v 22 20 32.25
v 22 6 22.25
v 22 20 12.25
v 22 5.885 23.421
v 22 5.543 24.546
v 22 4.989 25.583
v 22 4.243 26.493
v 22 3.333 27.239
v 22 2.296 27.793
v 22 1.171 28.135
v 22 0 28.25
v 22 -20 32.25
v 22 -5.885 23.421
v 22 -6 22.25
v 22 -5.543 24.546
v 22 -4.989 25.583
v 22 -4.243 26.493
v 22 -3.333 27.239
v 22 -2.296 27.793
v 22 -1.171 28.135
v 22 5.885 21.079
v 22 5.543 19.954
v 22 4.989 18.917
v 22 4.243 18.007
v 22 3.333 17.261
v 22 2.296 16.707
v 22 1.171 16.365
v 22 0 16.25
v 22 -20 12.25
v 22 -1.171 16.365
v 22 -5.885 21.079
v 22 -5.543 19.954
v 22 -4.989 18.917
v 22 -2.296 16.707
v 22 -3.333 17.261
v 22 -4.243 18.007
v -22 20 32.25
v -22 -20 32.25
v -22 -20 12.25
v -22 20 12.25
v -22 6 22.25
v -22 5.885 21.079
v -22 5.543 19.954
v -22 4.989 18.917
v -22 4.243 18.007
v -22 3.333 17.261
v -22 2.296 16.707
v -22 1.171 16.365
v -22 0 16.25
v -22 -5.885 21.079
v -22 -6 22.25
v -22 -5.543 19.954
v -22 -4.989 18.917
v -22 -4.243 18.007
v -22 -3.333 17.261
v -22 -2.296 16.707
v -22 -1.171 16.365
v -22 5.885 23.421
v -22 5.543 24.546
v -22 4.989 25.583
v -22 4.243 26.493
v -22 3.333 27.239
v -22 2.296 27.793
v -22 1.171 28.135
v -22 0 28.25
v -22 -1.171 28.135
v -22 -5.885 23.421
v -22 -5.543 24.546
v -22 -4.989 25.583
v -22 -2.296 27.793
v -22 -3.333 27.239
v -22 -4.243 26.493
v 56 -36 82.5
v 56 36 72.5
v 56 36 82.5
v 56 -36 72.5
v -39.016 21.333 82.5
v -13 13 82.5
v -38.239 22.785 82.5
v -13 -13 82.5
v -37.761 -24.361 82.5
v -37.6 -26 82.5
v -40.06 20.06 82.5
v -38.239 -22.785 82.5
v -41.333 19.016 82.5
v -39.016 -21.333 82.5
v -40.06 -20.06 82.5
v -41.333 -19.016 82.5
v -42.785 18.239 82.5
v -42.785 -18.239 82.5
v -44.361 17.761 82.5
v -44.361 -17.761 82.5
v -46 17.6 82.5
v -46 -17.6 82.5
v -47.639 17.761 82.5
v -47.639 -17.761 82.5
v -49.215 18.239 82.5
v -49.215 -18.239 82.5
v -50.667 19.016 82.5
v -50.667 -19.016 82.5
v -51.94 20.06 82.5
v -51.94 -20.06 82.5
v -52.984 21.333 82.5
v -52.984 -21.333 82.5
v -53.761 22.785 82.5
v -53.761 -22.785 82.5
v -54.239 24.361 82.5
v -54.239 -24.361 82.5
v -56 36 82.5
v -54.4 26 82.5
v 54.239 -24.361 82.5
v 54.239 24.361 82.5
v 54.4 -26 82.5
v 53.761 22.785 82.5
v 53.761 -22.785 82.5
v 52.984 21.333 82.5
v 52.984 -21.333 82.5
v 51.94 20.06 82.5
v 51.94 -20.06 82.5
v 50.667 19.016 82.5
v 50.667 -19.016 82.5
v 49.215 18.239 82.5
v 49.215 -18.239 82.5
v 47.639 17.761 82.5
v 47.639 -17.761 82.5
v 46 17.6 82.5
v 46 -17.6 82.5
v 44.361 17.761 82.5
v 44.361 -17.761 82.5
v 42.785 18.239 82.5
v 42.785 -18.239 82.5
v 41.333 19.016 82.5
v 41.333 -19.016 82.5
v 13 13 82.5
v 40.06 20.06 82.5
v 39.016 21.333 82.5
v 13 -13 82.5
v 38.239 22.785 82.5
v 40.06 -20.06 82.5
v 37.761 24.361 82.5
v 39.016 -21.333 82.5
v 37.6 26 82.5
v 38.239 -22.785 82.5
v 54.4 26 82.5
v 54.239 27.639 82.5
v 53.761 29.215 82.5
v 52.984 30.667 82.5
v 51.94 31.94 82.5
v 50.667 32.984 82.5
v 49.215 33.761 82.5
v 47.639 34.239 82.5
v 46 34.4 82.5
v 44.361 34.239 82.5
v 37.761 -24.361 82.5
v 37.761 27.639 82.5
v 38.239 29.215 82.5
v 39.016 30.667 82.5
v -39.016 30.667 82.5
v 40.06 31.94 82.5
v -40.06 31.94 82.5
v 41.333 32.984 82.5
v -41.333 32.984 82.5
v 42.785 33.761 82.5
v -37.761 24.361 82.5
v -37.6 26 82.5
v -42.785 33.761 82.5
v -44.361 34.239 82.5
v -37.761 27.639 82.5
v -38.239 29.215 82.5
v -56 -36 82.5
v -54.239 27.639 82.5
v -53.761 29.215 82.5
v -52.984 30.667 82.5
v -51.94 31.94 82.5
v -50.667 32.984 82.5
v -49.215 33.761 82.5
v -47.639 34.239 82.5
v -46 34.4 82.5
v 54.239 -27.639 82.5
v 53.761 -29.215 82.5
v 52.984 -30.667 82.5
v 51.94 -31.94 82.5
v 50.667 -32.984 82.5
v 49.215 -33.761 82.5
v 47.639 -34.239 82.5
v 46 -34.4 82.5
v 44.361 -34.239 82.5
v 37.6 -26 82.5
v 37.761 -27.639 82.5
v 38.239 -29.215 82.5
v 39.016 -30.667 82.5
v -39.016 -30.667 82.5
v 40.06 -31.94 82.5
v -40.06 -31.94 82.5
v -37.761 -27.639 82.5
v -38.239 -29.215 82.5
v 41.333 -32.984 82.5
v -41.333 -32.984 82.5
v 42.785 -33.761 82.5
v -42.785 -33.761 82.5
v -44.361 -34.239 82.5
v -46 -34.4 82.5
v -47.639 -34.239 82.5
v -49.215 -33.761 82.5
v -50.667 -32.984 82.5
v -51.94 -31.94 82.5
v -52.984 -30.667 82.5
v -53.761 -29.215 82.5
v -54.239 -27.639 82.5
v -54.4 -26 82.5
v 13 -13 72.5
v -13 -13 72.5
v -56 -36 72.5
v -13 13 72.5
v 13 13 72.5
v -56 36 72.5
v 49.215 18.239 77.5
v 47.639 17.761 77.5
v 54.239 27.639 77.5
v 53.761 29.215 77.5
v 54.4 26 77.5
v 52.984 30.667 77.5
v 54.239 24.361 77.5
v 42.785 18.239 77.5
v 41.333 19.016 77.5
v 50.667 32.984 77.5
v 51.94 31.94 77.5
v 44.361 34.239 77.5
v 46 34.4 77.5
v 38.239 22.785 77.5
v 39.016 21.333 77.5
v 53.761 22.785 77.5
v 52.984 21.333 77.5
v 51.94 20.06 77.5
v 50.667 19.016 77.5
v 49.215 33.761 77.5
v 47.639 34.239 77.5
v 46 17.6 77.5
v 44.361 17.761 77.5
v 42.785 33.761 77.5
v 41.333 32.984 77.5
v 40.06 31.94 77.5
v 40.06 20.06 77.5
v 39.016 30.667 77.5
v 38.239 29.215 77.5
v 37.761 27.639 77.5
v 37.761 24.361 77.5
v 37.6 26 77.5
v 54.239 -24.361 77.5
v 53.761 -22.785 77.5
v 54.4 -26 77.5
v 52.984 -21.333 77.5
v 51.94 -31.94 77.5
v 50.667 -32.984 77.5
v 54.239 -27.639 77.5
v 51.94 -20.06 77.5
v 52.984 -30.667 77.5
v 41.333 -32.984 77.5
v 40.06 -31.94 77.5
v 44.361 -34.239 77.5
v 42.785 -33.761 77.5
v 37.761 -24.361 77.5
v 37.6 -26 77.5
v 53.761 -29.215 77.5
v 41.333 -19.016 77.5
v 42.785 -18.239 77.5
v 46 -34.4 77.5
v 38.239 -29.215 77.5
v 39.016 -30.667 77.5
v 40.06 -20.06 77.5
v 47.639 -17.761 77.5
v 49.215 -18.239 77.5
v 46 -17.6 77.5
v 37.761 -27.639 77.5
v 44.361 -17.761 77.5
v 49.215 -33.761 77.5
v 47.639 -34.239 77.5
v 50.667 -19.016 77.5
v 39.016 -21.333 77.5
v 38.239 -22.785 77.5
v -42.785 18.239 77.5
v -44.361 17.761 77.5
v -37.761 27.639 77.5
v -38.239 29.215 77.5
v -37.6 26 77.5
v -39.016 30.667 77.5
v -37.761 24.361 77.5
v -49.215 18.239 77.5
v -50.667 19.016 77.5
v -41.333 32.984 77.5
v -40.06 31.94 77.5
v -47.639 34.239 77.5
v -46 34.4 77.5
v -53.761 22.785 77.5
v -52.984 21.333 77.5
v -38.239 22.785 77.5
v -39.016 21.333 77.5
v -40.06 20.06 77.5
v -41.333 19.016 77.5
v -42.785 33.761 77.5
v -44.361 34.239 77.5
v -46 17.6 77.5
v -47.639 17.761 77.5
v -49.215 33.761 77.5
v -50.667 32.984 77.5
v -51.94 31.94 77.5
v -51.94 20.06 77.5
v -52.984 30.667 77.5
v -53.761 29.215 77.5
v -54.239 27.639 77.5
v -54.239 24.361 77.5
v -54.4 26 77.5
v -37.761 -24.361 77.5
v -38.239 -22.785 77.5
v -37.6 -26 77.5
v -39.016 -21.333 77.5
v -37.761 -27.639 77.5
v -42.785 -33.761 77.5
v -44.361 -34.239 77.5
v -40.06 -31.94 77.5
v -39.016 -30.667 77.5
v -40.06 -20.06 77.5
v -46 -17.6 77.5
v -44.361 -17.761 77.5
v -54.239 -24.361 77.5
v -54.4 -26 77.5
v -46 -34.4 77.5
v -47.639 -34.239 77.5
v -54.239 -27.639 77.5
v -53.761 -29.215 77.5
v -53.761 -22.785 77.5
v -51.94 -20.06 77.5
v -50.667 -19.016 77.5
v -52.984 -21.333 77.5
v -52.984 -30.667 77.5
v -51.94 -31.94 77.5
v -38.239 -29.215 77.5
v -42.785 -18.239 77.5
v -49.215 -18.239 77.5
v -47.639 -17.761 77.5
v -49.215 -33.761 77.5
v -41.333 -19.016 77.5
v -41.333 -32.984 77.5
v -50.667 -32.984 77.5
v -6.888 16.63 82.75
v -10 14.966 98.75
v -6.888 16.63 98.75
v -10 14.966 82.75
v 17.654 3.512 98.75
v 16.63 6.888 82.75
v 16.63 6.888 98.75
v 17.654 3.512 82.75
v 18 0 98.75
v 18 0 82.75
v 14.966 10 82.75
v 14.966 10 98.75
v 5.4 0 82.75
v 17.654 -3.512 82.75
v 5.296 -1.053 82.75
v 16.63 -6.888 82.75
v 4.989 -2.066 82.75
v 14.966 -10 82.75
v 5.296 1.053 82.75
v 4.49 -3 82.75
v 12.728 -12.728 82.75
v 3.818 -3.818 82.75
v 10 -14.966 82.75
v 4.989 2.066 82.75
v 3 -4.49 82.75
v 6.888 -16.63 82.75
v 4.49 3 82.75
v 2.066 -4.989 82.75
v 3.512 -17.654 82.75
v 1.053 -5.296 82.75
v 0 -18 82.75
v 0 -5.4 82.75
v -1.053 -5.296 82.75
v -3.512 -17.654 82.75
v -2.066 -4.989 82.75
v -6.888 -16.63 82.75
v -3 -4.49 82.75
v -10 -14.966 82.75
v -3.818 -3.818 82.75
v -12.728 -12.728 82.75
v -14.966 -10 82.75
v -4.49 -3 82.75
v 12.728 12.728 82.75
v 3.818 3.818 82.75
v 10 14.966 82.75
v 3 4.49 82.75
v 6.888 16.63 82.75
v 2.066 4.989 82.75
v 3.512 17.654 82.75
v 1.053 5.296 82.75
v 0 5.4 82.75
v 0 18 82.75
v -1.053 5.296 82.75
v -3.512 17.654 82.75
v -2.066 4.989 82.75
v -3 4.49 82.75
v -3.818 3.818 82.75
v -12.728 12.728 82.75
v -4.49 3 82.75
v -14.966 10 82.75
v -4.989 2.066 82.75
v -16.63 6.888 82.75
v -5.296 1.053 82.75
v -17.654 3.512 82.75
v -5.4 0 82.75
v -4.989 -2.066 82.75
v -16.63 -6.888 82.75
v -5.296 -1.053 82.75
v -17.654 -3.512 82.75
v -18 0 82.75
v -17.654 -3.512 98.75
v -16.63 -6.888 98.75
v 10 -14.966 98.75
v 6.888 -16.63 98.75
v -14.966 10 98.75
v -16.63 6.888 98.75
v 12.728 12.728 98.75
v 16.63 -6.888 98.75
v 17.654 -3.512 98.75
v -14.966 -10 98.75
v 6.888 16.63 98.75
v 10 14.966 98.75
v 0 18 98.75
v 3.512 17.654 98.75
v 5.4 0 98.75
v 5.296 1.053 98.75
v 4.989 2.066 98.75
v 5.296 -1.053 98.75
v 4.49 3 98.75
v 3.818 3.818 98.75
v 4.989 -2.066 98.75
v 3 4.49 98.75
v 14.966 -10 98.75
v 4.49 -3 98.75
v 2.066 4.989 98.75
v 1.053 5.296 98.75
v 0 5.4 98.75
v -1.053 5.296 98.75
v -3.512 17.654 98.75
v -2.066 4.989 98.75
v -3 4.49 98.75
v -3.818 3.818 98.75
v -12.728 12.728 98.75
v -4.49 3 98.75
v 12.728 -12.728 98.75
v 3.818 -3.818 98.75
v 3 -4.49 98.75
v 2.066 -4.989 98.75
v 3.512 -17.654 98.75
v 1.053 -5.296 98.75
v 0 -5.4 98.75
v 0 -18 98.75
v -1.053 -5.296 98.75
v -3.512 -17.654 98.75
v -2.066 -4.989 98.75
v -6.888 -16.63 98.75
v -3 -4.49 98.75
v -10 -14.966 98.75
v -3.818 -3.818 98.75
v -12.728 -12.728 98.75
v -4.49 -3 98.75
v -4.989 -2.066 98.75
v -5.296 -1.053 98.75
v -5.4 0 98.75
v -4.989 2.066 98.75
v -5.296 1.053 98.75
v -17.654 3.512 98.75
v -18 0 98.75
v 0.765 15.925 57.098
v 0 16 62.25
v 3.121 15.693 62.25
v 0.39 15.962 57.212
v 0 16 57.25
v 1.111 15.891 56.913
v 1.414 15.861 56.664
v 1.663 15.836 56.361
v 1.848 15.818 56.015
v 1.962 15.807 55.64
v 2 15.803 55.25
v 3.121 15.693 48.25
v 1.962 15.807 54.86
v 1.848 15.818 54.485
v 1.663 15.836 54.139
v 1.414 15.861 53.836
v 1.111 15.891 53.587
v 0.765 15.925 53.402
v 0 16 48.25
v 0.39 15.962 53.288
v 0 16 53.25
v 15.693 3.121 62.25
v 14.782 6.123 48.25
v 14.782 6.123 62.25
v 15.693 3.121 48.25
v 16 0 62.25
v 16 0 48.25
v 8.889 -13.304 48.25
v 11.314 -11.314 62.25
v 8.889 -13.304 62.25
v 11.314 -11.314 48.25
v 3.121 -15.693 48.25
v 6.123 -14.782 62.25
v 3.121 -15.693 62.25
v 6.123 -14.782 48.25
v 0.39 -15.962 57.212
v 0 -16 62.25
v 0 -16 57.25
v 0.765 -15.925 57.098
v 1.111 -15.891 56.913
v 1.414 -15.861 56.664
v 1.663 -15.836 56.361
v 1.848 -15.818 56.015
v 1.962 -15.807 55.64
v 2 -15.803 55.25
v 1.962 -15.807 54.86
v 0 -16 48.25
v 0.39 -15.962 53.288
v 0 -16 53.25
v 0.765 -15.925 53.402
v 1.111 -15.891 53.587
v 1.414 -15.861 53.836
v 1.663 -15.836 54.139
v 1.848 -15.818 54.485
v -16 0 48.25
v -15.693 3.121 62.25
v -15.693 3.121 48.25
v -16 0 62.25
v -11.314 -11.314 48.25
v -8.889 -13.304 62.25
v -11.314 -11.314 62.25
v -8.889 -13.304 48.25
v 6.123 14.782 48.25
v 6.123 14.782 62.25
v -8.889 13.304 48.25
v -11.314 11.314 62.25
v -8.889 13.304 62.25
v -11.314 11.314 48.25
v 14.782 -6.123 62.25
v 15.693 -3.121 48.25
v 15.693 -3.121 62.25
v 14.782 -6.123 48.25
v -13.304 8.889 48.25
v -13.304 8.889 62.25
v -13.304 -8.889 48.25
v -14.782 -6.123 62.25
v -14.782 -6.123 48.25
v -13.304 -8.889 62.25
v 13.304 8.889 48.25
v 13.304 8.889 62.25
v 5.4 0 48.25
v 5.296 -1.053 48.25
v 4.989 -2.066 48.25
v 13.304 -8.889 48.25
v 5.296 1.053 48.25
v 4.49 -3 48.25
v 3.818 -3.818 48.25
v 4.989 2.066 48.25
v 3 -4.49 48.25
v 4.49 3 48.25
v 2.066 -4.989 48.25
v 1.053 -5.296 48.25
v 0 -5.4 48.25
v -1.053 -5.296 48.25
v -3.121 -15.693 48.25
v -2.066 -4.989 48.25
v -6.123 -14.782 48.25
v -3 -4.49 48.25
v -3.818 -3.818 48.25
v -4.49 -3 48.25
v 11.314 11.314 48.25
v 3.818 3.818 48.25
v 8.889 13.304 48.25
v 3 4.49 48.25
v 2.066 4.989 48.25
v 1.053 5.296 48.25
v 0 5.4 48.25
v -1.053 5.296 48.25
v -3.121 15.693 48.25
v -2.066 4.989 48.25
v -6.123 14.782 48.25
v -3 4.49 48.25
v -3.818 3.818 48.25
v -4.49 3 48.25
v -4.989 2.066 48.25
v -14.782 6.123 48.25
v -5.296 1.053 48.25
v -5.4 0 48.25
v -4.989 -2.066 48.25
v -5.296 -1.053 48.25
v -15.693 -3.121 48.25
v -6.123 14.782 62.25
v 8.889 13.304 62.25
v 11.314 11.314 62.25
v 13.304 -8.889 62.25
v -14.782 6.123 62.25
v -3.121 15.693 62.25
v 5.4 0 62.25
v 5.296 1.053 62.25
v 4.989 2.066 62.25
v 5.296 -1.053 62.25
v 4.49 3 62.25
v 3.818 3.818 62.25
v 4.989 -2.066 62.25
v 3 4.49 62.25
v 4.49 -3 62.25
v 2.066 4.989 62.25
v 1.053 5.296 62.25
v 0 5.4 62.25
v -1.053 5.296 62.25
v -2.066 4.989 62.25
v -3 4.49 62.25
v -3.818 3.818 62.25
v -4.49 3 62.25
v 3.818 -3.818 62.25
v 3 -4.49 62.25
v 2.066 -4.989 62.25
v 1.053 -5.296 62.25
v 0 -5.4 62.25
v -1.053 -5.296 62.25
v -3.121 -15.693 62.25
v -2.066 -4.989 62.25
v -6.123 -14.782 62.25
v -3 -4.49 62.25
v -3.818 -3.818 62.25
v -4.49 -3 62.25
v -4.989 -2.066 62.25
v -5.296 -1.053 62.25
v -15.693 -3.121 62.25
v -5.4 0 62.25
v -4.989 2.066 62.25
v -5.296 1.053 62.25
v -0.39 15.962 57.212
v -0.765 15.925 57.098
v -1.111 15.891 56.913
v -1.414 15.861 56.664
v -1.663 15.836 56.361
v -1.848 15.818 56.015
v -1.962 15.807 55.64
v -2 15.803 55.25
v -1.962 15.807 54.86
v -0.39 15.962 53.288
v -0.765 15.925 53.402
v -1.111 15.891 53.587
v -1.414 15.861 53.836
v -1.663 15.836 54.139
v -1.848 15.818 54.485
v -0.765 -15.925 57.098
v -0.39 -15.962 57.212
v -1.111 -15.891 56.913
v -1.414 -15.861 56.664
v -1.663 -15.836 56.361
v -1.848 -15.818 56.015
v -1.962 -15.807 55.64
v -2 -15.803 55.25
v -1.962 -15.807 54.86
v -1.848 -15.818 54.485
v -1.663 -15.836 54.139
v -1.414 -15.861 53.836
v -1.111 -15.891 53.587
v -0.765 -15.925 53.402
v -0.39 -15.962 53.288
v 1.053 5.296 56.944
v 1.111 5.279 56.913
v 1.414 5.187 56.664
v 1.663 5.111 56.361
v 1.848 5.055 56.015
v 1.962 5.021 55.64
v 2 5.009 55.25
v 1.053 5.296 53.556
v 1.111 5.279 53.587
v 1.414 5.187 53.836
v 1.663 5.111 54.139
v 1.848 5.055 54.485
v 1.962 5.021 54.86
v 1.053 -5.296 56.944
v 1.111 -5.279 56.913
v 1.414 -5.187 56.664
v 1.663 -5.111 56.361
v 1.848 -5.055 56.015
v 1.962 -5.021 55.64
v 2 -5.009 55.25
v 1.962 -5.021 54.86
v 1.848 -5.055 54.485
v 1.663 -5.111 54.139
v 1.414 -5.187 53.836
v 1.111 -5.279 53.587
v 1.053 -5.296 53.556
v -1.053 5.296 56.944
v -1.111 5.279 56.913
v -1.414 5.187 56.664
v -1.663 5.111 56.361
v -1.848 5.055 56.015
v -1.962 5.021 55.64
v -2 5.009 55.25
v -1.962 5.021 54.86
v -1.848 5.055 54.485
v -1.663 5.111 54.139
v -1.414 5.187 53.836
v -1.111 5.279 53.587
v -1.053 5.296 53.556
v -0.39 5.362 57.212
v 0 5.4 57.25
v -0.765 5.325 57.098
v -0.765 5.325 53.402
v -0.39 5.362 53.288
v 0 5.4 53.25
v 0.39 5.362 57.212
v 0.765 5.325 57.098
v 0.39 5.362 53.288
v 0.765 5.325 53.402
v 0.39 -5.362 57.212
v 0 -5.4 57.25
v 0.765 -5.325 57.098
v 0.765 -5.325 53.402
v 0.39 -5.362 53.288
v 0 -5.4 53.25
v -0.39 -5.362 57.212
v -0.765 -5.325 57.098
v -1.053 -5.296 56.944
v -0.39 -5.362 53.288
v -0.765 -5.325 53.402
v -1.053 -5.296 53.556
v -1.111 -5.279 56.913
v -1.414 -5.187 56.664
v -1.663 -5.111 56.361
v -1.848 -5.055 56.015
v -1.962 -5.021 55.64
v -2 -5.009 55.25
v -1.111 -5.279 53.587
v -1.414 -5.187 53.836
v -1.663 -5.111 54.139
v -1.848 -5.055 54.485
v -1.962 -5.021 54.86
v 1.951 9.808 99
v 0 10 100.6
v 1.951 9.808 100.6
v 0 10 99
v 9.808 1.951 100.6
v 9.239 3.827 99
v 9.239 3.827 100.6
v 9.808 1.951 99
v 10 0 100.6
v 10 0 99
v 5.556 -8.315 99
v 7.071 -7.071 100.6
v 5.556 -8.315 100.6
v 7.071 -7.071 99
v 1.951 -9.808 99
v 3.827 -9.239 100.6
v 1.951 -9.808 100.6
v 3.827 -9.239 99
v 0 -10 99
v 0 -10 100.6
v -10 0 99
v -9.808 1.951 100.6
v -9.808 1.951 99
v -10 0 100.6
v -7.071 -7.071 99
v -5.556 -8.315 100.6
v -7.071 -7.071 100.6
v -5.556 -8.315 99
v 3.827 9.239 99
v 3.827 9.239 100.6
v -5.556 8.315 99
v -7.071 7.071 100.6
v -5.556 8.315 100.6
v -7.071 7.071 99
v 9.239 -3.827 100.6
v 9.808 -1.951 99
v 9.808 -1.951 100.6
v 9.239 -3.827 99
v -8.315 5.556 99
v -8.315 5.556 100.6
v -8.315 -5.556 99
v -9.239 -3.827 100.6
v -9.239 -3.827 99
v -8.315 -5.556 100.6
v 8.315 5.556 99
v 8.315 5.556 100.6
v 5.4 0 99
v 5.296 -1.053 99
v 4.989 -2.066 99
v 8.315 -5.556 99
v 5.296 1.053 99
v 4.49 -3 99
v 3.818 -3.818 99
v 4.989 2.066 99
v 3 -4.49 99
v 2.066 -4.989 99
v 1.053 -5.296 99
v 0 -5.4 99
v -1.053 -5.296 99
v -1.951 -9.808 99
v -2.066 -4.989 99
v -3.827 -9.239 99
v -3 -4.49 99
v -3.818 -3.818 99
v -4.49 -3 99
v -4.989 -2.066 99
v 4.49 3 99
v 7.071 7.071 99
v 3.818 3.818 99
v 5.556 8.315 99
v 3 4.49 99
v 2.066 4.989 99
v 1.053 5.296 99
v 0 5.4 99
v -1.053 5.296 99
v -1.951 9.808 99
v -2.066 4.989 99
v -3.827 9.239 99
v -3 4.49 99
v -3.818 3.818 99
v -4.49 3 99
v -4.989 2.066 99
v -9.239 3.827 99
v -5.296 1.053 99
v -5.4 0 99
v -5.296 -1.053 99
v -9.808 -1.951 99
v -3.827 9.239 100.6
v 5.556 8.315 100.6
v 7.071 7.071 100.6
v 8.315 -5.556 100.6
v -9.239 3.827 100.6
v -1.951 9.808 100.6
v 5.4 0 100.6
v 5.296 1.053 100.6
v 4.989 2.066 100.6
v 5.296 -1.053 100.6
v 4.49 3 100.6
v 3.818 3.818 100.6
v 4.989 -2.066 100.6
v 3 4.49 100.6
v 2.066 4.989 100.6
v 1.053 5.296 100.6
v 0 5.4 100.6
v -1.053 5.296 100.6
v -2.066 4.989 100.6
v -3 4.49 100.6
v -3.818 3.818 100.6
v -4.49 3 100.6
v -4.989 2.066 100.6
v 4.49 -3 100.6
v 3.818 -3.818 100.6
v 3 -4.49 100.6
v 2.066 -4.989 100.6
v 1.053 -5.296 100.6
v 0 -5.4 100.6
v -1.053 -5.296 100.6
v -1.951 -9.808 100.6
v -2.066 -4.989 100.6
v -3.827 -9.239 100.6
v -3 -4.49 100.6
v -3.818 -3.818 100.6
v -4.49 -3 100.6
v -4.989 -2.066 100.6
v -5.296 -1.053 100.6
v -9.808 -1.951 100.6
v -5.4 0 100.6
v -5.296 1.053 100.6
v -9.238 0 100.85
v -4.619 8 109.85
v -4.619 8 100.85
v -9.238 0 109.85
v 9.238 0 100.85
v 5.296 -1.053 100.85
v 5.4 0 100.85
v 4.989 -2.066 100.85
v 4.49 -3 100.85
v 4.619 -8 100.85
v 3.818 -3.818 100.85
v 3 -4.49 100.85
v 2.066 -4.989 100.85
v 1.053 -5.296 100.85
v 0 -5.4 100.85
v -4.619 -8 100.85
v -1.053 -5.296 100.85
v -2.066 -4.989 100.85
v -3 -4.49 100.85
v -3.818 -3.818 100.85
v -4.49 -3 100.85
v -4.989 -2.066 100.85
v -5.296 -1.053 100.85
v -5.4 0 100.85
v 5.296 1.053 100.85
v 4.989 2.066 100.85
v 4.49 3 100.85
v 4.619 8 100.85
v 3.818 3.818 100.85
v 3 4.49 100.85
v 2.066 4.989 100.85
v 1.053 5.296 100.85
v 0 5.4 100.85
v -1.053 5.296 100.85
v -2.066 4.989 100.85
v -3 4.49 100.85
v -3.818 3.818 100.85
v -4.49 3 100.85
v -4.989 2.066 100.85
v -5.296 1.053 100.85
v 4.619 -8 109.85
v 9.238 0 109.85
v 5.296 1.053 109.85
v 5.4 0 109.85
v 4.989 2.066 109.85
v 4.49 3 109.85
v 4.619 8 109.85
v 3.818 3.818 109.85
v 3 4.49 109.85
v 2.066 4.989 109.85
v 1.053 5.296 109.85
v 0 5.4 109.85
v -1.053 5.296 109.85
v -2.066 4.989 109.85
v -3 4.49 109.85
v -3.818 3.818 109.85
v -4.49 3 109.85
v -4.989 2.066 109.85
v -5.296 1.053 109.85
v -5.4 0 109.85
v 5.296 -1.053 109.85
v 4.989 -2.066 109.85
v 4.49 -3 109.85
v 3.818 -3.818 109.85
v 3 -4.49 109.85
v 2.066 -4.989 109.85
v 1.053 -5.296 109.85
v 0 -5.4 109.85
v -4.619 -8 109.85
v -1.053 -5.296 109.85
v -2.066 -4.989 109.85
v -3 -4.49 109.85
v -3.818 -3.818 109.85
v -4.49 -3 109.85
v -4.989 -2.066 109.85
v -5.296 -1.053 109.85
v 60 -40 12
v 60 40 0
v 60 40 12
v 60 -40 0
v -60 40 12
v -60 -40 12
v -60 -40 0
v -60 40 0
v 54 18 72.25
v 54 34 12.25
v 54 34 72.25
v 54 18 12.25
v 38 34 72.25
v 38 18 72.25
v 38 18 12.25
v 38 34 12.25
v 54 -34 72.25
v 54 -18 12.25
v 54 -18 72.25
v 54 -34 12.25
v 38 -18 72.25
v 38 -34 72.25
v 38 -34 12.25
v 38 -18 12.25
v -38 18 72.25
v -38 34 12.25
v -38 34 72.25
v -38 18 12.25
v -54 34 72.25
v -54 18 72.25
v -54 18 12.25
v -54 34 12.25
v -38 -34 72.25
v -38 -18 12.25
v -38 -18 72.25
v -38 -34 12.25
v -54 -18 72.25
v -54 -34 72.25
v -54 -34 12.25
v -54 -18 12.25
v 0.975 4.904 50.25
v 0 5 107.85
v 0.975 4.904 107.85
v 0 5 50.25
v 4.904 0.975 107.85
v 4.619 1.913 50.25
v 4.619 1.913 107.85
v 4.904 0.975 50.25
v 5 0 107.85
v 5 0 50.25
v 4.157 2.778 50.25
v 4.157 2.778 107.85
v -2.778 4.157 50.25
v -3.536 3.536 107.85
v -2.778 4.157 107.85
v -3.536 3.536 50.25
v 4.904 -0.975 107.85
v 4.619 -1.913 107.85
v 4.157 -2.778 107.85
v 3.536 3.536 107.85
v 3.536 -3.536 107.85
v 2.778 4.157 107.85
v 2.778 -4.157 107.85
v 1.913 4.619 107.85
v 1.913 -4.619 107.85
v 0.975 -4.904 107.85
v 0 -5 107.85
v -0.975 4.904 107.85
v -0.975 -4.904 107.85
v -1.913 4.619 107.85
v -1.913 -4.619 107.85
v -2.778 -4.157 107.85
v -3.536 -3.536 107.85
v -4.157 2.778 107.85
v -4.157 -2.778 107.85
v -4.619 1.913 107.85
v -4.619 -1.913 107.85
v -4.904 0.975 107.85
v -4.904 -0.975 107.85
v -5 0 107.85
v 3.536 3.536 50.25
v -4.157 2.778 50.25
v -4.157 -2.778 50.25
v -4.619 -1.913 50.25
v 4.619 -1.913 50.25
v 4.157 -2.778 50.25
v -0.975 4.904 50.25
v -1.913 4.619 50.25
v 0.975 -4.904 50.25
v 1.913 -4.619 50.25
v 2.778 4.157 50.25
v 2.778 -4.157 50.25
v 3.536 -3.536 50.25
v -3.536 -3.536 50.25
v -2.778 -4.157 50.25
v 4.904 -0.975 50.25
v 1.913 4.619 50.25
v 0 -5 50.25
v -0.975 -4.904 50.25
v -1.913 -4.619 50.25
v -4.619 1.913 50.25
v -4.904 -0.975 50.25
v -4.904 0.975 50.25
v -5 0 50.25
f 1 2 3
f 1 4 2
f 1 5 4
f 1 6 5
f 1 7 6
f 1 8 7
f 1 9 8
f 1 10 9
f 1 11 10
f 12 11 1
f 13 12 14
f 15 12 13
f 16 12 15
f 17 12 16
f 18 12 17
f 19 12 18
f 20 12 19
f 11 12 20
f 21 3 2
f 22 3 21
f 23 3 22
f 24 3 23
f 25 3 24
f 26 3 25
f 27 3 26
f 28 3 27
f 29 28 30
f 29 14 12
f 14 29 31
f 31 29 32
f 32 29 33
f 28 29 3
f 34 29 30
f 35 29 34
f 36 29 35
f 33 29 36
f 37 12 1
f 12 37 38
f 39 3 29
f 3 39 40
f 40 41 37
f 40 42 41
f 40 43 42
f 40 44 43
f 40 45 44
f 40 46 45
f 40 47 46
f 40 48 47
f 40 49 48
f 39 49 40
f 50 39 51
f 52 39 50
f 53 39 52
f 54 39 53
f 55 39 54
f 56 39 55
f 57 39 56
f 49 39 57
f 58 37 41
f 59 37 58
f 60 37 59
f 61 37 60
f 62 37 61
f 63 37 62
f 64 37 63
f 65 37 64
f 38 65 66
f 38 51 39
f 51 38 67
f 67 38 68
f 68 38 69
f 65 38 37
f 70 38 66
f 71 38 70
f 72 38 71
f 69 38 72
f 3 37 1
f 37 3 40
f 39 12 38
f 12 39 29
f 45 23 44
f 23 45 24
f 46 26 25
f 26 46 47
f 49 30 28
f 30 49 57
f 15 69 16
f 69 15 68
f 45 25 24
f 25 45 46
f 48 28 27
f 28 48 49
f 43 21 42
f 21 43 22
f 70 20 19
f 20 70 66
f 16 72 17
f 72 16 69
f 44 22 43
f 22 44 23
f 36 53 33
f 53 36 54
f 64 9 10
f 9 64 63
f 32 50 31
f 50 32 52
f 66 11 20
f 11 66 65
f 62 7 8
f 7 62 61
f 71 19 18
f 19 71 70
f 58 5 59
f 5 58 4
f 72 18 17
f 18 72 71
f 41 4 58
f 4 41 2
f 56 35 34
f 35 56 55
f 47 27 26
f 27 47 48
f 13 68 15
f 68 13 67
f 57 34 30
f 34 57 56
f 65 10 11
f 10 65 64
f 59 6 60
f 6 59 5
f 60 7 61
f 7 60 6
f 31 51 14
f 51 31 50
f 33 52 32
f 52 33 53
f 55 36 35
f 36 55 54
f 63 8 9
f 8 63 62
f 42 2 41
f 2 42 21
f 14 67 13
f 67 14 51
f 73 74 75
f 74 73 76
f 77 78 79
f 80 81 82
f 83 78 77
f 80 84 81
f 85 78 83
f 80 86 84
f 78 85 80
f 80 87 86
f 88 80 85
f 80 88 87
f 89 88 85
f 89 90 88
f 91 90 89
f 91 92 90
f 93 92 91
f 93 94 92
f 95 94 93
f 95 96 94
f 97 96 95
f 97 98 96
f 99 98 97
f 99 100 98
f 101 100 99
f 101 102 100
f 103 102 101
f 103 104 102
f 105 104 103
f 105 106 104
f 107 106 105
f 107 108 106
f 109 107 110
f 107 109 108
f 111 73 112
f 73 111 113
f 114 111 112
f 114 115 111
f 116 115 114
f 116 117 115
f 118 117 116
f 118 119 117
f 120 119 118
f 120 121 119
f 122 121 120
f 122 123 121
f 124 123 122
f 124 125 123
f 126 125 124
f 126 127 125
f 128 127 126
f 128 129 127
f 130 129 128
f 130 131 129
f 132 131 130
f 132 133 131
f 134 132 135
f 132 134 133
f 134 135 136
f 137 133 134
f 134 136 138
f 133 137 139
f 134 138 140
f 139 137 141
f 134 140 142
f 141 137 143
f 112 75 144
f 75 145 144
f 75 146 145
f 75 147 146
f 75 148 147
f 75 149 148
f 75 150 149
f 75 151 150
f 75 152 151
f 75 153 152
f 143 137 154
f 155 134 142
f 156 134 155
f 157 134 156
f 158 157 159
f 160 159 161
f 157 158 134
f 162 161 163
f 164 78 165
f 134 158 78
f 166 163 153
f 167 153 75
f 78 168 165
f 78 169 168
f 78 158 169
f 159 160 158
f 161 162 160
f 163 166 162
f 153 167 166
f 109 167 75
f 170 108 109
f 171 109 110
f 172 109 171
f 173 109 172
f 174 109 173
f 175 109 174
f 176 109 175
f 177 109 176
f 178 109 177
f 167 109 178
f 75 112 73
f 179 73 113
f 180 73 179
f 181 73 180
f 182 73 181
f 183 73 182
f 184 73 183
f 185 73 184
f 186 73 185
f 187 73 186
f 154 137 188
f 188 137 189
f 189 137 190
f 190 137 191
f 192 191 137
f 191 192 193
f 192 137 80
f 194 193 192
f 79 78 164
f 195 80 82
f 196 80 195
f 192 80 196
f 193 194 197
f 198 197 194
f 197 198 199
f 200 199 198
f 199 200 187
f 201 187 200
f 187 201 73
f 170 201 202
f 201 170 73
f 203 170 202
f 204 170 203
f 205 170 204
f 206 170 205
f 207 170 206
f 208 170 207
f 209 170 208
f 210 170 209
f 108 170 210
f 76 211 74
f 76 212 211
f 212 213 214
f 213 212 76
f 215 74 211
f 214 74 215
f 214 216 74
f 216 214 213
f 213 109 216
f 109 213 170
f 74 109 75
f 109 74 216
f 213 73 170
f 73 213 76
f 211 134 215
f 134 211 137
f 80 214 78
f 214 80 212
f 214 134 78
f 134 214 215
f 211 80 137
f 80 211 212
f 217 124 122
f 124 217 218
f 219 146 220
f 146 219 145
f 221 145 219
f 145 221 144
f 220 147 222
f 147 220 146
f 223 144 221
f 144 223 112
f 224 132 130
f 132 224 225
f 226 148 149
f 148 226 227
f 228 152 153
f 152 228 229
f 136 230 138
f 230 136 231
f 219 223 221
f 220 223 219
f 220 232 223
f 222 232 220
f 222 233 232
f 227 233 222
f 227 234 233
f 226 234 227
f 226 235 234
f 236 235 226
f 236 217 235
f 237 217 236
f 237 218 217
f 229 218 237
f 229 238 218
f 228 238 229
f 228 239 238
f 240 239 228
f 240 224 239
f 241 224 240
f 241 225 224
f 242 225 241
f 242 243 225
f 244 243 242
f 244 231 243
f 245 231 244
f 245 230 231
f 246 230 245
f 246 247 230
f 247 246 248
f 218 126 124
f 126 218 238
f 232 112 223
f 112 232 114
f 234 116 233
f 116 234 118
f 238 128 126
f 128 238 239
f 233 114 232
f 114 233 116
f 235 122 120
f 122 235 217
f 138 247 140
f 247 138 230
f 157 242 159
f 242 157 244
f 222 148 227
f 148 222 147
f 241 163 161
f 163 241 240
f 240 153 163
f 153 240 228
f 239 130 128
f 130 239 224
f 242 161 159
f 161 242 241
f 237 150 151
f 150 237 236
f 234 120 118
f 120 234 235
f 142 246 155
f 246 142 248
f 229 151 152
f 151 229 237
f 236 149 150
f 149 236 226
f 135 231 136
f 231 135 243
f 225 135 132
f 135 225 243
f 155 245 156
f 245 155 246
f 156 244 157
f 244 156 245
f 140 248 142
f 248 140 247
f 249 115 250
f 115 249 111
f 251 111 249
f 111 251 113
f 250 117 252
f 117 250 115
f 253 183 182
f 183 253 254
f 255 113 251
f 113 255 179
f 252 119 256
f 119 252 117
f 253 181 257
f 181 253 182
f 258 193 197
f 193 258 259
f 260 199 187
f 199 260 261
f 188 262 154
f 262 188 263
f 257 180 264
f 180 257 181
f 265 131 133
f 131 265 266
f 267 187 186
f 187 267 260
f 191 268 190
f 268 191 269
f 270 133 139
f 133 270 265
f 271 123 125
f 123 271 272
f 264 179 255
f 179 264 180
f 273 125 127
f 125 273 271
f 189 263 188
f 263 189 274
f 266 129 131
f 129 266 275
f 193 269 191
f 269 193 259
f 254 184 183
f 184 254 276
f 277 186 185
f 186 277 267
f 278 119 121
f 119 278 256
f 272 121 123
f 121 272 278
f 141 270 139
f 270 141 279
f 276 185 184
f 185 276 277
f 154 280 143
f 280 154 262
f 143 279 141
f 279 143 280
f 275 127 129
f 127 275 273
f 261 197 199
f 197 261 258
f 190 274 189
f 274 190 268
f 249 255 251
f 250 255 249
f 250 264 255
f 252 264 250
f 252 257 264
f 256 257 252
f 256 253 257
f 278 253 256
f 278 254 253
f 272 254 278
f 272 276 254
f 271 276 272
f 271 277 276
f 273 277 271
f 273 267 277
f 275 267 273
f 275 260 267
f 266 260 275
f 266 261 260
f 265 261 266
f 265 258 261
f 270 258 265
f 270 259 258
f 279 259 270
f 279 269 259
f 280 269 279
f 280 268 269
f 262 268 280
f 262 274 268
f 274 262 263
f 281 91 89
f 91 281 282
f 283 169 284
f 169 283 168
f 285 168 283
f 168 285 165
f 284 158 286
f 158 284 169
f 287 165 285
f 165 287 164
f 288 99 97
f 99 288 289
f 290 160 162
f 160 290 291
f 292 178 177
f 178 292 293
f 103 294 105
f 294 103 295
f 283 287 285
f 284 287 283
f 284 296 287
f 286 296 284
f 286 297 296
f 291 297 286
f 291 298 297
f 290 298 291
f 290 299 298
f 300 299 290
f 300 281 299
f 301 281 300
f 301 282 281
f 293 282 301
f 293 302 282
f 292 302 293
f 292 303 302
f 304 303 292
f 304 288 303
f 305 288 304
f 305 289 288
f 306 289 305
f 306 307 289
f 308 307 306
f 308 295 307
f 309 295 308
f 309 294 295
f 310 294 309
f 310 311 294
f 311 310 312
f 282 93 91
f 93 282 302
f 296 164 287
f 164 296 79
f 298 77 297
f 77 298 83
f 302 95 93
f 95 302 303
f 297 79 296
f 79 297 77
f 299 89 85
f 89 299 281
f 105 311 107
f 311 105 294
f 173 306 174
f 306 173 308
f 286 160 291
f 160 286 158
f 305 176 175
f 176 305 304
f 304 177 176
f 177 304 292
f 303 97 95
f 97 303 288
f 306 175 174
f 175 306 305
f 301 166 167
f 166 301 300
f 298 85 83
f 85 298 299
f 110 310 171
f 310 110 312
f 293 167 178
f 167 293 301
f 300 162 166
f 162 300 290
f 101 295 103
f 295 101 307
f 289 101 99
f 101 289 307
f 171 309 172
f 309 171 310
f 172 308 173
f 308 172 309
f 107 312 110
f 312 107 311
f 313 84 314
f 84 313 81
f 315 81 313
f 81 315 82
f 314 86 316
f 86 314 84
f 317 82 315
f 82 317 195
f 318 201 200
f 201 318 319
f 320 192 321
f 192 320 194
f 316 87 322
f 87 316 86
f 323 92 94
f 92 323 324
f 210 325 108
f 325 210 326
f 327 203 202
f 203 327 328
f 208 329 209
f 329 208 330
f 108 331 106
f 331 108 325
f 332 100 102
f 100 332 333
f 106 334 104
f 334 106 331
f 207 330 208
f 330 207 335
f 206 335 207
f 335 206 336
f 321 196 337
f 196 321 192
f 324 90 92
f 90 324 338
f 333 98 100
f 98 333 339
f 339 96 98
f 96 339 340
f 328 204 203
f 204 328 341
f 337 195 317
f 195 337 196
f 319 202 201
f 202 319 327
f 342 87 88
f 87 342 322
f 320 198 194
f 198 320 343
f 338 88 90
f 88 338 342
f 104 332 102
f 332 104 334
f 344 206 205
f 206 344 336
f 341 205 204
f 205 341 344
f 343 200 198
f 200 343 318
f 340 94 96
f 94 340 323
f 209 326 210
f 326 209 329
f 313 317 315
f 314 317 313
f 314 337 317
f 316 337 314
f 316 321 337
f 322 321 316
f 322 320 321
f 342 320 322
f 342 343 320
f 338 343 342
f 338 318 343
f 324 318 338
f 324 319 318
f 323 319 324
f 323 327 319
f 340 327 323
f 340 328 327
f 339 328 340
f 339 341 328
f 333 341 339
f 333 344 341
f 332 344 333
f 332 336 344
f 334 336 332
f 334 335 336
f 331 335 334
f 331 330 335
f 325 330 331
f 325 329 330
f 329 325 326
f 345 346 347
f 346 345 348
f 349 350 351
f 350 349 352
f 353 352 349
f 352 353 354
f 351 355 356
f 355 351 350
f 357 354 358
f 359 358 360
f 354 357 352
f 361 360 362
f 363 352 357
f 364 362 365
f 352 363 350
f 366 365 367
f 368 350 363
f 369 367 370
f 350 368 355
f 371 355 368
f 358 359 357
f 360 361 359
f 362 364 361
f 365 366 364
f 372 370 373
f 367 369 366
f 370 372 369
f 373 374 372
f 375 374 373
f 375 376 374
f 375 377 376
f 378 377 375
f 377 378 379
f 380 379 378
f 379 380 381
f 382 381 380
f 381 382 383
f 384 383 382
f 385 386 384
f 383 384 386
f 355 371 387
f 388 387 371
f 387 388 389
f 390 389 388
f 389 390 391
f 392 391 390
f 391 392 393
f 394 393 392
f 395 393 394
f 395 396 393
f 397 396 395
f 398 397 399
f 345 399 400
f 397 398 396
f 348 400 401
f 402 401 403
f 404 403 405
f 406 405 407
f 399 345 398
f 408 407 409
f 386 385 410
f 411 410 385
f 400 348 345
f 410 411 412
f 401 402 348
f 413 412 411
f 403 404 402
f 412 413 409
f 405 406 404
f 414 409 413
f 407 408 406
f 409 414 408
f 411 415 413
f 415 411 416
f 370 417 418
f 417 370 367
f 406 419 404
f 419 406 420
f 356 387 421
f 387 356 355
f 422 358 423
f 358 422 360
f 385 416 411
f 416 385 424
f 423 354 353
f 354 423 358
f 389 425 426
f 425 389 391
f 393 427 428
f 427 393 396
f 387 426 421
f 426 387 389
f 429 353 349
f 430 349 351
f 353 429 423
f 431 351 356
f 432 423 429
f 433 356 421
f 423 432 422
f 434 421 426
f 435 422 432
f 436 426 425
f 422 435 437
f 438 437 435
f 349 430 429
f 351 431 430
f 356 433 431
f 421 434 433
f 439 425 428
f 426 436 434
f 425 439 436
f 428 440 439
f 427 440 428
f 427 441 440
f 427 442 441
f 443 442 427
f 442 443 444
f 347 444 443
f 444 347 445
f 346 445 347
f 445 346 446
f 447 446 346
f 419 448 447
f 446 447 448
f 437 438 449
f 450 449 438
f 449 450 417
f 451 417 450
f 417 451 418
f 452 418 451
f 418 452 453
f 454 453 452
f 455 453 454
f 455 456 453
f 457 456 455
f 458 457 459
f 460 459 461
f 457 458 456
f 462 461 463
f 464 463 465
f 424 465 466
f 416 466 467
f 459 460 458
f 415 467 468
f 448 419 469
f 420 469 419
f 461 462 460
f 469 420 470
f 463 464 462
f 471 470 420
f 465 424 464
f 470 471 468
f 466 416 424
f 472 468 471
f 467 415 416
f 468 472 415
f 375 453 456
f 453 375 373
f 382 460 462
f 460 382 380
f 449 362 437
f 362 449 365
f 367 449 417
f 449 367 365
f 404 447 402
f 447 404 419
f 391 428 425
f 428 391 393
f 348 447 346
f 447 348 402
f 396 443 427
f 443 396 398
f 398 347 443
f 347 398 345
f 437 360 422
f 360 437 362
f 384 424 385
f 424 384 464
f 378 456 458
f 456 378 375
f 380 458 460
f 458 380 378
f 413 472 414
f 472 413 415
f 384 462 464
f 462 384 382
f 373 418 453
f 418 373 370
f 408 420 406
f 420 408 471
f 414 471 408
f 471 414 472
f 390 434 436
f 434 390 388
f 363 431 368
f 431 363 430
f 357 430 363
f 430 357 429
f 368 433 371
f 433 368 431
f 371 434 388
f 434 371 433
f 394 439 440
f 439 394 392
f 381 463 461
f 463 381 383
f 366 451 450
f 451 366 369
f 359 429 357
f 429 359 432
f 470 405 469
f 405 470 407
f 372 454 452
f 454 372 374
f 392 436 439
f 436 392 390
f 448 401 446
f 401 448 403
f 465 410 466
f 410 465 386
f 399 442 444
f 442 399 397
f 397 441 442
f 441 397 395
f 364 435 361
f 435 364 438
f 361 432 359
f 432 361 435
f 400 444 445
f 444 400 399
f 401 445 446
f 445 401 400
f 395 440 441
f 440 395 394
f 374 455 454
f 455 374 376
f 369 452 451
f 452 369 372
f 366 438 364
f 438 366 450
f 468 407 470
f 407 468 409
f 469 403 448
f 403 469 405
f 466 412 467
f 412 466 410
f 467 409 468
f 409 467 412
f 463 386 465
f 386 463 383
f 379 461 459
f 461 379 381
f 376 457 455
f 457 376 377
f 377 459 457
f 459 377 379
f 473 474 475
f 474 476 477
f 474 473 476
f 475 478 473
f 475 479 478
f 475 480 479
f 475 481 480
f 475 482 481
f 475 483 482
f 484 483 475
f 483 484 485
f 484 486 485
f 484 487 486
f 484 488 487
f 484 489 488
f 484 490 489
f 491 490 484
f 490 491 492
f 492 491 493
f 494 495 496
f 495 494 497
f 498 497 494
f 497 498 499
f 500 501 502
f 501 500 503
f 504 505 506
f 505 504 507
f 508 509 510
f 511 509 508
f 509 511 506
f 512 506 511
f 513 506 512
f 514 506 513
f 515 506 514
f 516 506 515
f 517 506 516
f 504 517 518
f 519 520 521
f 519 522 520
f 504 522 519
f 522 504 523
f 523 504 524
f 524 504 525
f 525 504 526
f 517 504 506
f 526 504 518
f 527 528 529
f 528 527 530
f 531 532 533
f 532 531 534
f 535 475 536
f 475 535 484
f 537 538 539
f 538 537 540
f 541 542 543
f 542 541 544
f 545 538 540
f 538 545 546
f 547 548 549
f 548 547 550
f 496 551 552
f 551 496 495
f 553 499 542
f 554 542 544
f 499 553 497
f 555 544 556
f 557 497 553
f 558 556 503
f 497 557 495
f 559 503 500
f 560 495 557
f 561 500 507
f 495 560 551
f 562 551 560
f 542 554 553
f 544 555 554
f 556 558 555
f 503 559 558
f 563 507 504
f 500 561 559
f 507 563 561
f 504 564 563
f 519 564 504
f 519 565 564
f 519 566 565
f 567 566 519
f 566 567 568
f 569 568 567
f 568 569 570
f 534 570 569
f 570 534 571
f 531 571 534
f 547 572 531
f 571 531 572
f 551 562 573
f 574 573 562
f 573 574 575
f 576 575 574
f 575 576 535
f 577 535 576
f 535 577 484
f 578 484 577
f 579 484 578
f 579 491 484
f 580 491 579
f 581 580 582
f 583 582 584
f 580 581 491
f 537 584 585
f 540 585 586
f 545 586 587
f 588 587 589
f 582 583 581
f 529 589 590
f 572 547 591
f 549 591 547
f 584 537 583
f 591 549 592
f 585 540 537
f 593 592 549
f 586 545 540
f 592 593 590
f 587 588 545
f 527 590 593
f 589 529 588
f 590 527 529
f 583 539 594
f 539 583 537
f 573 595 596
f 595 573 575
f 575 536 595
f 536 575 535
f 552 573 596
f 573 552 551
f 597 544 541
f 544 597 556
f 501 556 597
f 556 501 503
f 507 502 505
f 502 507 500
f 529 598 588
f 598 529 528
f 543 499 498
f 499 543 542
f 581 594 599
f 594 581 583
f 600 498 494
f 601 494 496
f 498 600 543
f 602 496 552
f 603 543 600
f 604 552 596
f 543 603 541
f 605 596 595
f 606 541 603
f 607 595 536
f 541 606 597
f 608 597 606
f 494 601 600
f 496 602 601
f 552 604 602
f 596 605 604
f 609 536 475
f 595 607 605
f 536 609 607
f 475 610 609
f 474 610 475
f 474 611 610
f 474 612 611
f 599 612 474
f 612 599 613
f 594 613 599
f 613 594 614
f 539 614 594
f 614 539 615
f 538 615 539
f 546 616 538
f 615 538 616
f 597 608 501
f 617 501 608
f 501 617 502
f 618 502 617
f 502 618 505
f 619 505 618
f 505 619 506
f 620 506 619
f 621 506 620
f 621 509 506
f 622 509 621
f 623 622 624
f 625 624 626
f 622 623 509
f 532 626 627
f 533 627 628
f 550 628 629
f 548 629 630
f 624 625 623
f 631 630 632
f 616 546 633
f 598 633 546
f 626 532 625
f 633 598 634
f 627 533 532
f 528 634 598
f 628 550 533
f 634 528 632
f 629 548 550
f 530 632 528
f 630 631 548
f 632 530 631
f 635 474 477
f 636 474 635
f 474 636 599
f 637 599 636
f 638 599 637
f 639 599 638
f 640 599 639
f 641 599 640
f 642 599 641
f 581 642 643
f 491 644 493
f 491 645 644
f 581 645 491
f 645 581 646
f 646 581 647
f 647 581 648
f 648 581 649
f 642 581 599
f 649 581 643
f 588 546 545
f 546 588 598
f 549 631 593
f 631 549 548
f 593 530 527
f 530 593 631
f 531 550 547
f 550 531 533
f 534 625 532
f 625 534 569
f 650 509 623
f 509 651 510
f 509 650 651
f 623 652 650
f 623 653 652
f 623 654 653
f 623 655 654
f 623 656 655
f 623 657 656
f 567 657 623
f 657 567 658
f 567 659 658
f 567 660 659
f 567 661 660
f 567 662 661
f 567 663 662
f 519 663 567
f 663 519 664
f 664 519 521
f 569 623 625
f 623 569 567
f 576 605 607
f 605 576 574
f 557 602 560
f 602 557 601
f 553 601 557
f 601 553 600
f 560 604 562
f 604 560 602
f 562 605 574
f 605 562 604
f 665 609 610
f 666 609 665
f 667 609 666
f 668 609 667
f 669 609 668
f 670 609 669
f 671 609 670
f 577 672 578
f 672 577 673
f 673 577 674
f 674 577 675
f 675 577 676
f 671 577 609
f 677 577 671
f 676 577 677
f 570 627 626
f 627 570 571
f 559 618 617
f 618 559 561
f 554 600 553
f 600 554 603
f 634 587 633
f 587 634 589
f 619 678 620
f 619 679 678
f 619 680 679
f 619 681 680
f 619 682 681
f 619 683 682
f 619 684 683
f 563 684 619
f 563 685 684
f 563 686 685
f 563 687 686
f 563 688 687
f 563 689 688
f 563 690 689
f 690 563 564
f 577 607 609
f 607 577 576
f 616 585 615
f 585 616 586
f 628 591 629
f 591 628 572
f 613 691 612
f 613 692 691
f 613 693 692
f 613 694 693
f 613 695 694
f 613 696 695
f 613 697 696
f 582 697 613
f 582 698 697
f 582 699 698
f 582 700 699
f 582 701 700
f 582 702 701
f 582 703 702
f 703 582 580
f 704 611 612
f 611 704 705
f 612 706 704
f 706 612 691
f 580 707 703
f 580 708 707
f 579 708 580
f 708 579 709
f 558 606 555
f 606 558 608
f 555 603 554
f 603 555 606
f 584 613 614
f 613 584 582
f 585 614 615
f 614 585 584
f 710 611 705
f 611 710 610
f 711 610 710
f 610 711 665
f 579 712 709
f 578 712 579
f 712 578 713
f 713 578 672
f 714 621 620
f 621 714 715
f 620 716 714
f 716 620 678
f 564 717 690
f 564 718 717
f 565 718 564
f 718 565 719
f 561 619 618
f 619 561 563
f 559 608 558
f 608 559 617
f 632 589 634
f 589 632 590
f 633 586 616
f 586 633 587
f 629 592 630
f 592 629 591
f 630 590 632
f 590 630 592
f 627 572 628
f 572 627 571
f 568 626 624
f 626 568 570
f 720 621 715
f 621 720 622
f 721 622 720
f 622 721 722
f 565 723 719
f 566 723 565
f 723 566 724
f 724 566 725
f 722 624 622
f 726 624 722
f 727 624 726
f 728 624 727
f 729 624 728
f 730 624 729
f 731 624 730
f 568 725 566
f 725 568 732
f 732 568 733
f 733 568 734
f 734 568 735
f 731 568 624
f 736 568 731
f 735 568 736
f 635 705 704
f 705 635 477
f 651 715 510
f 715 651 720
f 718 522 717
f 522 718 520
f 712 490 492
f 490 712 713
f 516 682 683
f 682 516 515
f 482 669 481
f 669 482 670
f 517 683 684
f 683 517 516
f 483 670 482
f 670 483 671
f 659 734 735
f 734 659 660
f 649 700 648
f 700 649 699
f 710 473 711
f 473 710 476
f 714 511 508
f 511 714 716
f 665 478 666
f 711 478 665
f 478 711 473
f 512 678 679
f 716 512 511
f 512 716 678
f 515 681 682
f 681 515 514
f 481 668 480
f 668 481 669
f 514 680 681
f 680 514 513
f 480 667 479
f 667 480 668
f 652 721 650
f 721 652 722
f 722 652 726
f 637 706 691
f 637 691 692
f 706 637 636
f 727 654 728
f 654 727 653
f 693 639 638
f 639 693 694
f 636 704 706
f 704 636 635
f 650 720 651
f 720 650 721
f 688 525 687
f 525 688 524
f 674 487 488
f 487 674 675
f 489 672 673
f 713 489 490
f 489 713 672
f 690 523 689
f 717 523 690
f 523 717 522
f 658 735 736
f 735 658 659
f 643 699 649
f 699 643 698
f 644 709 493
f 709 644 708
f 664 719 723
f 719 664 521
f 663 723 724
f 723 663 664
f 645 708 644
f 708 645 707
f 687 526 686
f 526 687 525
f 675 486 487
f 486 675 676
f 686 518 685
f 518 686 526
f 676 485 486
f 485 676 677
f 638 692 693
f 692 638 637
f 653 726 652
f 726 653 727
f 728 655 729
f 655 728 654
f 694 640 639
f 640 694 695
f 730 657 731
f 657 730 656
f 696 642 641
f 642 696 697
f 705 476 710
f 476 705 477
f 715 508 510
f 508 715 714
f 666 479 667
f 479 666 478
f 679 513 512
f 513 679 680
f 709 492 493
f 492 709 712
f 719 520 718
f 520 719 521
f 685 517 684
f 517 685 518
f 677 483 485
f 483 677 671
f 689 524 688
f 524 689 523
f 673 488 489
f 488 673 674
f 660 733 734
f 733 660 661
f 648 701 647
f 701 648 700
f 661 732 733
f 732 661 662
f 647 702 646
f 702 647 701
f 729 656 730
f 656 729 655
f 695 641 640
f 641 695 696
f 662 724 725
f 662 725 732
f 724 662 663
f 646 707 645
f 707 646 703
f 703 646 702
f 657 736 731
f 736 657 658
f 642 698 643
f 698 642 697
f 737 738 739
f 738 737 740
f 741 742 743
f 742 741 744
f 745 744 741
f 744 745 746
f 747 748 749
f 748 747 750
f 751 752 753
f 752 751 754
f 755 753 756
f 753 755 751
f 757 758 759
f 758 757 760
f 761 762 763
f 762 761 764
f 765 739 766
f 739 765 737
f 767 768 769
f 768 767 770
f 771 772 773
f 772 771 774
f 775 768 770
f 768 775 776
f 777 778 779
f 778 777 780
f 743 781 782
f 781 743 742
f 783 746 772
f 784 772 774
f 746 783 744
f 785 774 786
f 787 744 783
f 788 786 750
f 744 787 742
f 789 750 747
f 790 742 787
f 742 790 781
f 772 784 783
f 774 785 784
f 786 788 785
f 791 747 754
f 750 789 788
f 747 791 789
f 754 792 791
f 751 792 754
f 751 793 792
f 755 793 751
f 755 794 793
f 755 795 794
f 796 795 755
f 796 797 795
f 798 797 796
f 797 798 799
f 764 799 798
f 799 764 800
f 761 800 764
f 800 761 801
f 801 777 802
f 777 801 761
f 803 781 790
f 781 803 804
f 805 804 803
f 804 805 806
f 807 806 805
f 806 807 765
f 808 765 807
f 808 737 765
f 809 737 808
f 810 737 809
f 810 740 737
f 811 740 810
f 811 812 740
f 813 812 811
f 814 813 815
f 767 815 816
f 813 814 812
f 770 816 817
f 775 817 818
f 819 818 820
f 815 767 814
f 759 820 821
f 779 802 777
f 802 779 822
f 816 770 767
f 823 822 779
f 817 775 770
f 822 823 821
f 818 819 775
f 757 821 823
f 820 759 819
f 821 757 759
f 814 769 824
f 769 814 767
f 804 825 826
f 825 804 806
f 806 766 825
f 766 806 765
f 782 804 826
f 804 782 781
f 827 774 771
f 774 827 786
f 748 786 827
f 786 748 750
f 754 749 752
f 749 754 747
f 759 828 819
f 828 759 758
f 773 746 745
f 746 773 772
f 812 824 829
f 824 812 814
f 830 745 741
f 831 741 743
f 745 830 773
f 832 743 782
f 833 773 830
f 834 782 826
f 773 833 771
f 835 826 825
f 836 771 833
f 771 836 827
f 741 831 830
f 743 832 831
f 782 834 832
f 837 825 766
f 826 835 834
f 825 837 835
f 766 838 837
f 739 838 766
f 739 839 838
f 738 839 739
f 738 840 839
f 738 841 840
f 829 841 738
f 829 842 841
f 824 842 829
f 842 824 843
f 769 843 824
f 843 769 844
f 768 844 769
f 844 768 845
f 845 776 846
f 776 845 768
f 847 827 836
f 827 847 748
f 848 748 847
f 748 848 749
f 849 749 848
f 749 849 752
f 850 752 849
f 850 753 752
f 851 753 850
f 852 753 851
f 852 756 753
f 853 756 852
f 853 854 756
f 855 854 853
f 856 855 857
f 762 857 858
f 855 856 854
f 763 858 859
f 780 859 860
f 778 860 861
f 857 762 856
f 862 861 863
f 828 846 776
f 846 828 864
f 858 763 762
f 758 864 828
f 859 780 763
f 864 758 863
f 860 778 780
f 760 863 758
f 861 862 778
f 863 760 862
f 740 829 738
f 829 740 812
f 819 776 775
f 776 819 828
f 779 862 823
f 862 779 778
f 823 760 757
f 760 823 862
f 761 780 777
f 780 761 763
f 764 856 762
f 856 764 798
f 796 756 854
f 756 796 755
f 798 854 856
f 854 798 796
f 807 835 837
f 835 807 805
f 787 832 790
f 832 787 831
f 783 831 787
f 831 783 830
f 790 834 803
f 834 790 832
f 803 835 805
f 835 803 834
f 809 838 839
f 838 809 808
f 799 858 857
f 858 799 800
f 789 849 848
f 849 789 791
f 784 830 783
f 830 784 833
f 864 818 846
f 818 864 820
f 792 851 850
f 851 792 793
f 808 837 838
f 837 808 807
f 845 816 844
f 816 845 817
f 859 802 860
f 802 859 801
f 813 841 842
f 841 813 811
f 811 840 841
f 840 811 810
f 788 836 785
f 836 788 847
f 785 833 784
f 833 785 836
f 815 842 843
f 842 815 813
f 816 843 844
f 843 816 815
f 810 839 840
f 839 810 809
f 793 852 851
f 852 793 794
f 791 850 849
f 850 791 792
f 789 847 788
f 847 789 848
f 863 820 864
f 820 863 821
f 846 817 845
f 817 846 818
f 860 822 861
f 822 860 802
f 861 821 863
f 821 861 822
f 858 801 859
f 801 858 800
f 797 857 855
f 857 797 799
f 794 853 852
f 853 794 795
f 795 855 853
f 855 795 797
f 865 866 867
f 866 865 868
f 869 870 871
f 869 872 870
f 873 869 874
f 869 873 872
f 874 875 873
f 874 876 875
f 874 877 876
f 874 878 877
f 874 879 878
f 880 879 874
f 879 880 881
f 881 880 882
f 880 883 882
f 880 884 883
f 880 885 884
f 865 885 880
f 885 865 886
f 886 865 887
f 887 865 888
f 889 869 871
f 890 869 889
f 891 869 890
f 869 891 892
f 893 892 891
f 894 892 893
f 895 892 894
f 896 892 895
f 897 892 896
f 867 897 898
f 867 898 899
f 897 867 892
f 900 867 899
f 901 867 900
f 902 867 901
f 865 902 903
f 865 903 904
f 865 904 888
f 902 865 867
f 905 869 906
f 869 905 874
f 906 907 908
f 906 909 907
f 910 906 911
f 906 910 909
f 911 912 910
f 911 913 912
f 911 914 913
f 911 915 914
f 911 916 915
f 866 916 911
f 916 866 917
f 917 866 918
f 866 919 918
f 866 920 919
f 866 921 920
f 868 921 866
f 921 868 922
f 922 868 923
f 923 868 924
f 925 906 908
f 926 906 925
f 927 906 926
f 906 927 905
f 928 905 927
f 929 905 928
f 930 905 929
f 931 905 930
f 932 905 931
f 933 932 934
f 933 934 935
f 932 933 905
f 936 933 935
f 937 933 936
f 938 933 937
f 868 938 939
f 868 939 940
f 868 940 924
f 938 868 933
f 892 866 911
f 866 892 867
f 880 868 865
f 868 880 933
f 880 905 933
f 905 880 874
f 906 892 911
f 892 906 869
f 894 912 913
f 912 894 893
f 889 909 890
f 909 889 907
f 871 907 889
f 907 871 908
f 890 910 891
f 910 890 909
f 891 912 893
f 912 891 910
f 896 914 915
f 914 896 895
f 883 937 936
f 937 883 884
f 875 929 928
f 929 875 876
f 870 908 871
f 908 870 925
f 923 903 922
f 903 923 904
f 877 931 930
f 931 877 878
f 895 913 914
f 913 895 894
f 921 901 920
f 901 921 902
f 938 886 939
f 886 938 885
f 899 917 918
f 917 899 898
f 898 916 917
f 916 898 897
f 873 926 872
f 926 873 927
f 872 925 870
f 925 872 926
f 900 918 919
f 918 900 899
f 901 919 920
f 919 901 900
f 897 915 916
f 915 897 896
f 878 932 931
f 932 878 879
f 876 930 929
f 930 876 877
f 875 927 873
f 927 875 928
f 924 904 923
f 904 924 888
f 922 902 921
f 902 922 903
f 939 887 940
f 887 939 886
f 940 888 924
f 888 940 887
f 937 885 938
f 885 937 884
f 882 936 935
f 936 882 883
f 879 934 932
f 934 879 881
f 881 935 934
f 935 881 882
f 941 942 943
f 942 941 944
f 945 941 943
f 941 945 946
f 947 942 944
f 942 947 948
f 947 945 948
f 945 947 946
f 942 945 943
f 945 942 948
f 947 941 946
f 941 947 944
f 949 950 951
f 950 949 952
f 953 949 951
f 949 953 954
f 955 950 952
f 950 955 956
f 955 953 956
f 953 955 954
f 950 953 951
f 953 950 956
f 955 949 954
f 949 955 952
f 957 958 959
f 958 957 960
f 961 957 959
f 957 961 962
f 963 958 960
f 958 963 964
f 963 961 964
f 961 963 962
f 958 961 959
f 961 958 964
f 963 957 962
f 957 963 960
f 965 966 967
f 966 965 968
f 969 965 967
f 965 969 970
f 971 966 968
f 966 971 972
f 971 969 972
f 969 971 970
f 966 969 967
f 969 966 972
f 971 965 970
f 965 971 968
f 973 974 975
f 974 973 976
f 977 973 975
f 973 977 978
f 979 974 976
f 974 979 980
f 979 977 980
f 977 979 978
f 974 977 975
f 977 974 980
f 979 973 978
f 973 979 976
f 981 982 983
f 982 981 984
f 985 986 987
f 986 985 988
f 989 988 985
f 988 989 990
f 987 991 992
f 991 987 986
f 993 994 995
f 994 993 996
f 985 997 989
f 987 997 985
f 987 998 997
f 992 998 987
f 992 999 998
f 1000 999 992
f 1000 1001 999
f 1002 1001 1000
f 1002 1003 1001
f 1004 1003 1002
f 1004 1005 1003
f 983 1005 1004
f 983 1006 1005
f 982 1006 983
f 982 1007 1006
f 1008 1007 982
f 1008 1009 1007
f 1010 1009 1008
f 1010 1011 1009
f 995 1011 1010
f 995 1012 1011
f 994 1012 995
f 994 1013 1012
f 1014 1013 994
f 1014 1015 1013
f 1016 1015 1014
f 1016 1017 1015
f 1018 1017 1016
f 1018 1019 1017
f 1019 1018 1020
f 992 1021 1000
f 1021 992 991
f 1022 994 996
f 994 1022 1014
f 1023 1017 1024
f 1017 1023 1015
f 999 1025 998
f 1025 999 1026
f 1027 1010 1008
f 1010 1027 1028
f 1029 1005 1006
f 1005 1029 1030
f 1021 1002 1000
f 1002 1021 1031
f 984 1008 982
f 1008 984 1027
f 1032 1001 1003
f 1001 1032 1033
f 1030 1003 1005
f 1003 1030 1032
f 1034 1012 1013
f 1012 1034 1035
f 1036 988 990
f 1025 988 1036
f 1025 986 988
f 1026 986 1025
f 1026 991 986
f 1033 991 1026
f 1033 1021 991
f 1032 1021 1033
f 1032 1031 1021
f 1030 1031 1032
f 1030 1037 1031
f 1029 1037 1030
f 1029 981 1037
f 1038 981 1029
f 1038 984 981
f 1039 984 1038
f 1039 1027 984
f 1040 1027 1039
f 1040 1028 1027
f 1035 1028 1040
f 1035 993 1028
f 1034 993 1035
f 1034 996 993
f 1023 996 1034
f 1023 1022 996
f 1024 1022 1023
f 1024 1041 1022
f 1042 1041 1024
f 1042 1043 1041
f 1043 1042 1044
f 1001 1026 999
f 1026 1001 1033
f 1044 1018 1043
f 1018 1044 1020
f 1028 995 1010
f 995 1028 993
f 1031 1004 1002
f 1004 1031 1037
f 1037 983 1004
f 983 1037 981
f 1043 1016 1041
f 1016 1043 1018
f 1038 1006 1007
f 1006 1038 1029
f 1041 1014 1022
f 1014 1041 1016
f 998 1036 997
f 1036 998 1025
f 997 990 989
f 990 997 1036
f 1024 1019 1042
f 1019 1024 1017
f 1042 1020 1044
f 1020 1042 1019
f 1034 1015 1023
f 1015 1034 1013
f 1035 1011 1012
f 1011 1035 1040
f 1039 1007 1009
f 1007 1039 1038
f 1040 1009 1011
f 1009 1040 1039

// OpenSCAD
$fn = 32;

// ------------------------------------------------------------------------
// Arbor press fixture: screw d10, posts 60 mm, gap 16 mm
// Every part is its own module, assembly() places every instance.
// ------------------------------------------------------------------------

// --- part 1 ---
module press_bed() {
  difference() {
    translate([-60, -40, 0]) cube([120, 80, 12]);
  }
}

// --- part 2 ---
module anvil_block() {
  difference() {
    translate([-22, -20, 0]) cube([44, 40, 20]);
    translate([0, 0, 10]) rotate([0, 90, 0]) cylinder(h = 46, d = 12, center = true);
  }
}

// --- part 3 ---
module press_post_a() {
  translate([-8, -8, 0]) cube([16, 16, 60]);
}

// --- part 4 ---
module press_post_b() {
  translate([-8, -8, 0]) cube([16, 16, 60]);
}

// --- part 5 ---
module press_post_c() {
  translate([-8, -8, 0]) cube([16, 16, 60]);
}

// --- part 6 ---
module press_post_d() {
  translate([-8, -8, 0]) cube([16, 16, 60]);
}

// --- part 7 ---
module press_frame() {
  difference() {
    translate([-56, -36, 0]) cube([112, 72, 10]);
    translate([-13, -13, -1]) cube([26, 26, 12]);
    translate([46, 26, 5]) cylinder(h = 6, d = 16.8);
    translate([46, -26, 5]) cylinder(h = 6, d = 16.8);
    translate([-46, 26, 5]) cylinder(h = 6, d = 16.8);
    translate([-46, -26, 5]) cylinder(h = 6, d = 16.8);
  }
}

// --- part 8 ---
module guide_ring() {
  difference() {
      translate([0, 0, 0]) cylinder(h = 16, d = 36);
      translate([0, 0, -1]) cylinder(h = 18, d = 10.8);
    }
}

// --- part 9 ---
module press_screw() {
  translate([0, 0, -28.8]) cylinder(h = 57.6, d = 10);
}

// --- part 10 ---
module press_head() {
  difference() {
    cylinder(h = 14, d = 32);
    translate([0, 0, -1]) cylinder(h = 16, d = 10.8);
    translate([0, 0, 7]) rotate([90, 0, 0]) cylinder(h = 34, d = 4, center = true);
  }
}

// --- part 11 ---
module nut_washer() {
  difference() {
      translate([0, 0, 0]) cylinder(h = 1.6, d = 20);
      translate([0, 0, -1]) cylinder(h = 3.6, d = 10.8);
    }
}

// --- part 12 ---
module press_nut() {
  difference() {
    linear_extrude(height = 9) polygon(points = [[9.238, 0], [4.619, 8], [-4.619, 8], [-9.238, 0], [-4.619, -8], [4.619, -8]]);
    translate([0, 0, -1]) cylinder(h = 11, d = 10.8);
  }
}

// --- assembly ---
module assembly() {
  color([0.80, 0.24, 0.20]) translate([0, 0, 0]) rotate([0, 0, 0]) press_bed();
  color([0.20, 0.45, 0.75]) translate([0, 0, 12.25]) rotate([0, 0, 0]) anvil_block();
  color([0.25, 0.62, 0.32]) translate([46, 26, 12.25]) rotate([0, 0, 0]) press_post_a();
  color([0.92, 0.70, 0.18]) translate([46, -26, 12.25]) rotate([0, 0, 0]) press_post_b();
  color([0.58, 0.35, 0.70]) translate([-46, 26, 12.25]) rotate([0, 0, 0]) press_post_c();
  color([0.16, 0.66, 0.66]) translate([-46, -26, 12.25]) rotate([0, 0, 0]) press_post_d();
  color([0.85, 0.48, 0.18]) translate([0, 0, 72.5]) rotate([0, 0, 0]) press_frame();
  color([0.55, 0.60, 0.65]) translate([0, 0, 82.75]) rotate([0, 0, 0]) guide_ring();
  color([0.75, 0.30, 0.55]) translate([0, 0, 79.05]) rotate([0, 0, 0]) press_screw();
  color([0.42, 0.52, 0.28]) translate([0, 0, 48.25]) rotate([0, 0, 0]) press_head();
  color([0.80, 0.24, 0.20]) translate([0, 0, 99]) rotate([0, 0, 0]) nut_washer();
  color([0.20, 0.45, 0.75]) translate([0, 0, 100.85]) rotate([0, 0, 0]) press_nut();
}

assembly();
